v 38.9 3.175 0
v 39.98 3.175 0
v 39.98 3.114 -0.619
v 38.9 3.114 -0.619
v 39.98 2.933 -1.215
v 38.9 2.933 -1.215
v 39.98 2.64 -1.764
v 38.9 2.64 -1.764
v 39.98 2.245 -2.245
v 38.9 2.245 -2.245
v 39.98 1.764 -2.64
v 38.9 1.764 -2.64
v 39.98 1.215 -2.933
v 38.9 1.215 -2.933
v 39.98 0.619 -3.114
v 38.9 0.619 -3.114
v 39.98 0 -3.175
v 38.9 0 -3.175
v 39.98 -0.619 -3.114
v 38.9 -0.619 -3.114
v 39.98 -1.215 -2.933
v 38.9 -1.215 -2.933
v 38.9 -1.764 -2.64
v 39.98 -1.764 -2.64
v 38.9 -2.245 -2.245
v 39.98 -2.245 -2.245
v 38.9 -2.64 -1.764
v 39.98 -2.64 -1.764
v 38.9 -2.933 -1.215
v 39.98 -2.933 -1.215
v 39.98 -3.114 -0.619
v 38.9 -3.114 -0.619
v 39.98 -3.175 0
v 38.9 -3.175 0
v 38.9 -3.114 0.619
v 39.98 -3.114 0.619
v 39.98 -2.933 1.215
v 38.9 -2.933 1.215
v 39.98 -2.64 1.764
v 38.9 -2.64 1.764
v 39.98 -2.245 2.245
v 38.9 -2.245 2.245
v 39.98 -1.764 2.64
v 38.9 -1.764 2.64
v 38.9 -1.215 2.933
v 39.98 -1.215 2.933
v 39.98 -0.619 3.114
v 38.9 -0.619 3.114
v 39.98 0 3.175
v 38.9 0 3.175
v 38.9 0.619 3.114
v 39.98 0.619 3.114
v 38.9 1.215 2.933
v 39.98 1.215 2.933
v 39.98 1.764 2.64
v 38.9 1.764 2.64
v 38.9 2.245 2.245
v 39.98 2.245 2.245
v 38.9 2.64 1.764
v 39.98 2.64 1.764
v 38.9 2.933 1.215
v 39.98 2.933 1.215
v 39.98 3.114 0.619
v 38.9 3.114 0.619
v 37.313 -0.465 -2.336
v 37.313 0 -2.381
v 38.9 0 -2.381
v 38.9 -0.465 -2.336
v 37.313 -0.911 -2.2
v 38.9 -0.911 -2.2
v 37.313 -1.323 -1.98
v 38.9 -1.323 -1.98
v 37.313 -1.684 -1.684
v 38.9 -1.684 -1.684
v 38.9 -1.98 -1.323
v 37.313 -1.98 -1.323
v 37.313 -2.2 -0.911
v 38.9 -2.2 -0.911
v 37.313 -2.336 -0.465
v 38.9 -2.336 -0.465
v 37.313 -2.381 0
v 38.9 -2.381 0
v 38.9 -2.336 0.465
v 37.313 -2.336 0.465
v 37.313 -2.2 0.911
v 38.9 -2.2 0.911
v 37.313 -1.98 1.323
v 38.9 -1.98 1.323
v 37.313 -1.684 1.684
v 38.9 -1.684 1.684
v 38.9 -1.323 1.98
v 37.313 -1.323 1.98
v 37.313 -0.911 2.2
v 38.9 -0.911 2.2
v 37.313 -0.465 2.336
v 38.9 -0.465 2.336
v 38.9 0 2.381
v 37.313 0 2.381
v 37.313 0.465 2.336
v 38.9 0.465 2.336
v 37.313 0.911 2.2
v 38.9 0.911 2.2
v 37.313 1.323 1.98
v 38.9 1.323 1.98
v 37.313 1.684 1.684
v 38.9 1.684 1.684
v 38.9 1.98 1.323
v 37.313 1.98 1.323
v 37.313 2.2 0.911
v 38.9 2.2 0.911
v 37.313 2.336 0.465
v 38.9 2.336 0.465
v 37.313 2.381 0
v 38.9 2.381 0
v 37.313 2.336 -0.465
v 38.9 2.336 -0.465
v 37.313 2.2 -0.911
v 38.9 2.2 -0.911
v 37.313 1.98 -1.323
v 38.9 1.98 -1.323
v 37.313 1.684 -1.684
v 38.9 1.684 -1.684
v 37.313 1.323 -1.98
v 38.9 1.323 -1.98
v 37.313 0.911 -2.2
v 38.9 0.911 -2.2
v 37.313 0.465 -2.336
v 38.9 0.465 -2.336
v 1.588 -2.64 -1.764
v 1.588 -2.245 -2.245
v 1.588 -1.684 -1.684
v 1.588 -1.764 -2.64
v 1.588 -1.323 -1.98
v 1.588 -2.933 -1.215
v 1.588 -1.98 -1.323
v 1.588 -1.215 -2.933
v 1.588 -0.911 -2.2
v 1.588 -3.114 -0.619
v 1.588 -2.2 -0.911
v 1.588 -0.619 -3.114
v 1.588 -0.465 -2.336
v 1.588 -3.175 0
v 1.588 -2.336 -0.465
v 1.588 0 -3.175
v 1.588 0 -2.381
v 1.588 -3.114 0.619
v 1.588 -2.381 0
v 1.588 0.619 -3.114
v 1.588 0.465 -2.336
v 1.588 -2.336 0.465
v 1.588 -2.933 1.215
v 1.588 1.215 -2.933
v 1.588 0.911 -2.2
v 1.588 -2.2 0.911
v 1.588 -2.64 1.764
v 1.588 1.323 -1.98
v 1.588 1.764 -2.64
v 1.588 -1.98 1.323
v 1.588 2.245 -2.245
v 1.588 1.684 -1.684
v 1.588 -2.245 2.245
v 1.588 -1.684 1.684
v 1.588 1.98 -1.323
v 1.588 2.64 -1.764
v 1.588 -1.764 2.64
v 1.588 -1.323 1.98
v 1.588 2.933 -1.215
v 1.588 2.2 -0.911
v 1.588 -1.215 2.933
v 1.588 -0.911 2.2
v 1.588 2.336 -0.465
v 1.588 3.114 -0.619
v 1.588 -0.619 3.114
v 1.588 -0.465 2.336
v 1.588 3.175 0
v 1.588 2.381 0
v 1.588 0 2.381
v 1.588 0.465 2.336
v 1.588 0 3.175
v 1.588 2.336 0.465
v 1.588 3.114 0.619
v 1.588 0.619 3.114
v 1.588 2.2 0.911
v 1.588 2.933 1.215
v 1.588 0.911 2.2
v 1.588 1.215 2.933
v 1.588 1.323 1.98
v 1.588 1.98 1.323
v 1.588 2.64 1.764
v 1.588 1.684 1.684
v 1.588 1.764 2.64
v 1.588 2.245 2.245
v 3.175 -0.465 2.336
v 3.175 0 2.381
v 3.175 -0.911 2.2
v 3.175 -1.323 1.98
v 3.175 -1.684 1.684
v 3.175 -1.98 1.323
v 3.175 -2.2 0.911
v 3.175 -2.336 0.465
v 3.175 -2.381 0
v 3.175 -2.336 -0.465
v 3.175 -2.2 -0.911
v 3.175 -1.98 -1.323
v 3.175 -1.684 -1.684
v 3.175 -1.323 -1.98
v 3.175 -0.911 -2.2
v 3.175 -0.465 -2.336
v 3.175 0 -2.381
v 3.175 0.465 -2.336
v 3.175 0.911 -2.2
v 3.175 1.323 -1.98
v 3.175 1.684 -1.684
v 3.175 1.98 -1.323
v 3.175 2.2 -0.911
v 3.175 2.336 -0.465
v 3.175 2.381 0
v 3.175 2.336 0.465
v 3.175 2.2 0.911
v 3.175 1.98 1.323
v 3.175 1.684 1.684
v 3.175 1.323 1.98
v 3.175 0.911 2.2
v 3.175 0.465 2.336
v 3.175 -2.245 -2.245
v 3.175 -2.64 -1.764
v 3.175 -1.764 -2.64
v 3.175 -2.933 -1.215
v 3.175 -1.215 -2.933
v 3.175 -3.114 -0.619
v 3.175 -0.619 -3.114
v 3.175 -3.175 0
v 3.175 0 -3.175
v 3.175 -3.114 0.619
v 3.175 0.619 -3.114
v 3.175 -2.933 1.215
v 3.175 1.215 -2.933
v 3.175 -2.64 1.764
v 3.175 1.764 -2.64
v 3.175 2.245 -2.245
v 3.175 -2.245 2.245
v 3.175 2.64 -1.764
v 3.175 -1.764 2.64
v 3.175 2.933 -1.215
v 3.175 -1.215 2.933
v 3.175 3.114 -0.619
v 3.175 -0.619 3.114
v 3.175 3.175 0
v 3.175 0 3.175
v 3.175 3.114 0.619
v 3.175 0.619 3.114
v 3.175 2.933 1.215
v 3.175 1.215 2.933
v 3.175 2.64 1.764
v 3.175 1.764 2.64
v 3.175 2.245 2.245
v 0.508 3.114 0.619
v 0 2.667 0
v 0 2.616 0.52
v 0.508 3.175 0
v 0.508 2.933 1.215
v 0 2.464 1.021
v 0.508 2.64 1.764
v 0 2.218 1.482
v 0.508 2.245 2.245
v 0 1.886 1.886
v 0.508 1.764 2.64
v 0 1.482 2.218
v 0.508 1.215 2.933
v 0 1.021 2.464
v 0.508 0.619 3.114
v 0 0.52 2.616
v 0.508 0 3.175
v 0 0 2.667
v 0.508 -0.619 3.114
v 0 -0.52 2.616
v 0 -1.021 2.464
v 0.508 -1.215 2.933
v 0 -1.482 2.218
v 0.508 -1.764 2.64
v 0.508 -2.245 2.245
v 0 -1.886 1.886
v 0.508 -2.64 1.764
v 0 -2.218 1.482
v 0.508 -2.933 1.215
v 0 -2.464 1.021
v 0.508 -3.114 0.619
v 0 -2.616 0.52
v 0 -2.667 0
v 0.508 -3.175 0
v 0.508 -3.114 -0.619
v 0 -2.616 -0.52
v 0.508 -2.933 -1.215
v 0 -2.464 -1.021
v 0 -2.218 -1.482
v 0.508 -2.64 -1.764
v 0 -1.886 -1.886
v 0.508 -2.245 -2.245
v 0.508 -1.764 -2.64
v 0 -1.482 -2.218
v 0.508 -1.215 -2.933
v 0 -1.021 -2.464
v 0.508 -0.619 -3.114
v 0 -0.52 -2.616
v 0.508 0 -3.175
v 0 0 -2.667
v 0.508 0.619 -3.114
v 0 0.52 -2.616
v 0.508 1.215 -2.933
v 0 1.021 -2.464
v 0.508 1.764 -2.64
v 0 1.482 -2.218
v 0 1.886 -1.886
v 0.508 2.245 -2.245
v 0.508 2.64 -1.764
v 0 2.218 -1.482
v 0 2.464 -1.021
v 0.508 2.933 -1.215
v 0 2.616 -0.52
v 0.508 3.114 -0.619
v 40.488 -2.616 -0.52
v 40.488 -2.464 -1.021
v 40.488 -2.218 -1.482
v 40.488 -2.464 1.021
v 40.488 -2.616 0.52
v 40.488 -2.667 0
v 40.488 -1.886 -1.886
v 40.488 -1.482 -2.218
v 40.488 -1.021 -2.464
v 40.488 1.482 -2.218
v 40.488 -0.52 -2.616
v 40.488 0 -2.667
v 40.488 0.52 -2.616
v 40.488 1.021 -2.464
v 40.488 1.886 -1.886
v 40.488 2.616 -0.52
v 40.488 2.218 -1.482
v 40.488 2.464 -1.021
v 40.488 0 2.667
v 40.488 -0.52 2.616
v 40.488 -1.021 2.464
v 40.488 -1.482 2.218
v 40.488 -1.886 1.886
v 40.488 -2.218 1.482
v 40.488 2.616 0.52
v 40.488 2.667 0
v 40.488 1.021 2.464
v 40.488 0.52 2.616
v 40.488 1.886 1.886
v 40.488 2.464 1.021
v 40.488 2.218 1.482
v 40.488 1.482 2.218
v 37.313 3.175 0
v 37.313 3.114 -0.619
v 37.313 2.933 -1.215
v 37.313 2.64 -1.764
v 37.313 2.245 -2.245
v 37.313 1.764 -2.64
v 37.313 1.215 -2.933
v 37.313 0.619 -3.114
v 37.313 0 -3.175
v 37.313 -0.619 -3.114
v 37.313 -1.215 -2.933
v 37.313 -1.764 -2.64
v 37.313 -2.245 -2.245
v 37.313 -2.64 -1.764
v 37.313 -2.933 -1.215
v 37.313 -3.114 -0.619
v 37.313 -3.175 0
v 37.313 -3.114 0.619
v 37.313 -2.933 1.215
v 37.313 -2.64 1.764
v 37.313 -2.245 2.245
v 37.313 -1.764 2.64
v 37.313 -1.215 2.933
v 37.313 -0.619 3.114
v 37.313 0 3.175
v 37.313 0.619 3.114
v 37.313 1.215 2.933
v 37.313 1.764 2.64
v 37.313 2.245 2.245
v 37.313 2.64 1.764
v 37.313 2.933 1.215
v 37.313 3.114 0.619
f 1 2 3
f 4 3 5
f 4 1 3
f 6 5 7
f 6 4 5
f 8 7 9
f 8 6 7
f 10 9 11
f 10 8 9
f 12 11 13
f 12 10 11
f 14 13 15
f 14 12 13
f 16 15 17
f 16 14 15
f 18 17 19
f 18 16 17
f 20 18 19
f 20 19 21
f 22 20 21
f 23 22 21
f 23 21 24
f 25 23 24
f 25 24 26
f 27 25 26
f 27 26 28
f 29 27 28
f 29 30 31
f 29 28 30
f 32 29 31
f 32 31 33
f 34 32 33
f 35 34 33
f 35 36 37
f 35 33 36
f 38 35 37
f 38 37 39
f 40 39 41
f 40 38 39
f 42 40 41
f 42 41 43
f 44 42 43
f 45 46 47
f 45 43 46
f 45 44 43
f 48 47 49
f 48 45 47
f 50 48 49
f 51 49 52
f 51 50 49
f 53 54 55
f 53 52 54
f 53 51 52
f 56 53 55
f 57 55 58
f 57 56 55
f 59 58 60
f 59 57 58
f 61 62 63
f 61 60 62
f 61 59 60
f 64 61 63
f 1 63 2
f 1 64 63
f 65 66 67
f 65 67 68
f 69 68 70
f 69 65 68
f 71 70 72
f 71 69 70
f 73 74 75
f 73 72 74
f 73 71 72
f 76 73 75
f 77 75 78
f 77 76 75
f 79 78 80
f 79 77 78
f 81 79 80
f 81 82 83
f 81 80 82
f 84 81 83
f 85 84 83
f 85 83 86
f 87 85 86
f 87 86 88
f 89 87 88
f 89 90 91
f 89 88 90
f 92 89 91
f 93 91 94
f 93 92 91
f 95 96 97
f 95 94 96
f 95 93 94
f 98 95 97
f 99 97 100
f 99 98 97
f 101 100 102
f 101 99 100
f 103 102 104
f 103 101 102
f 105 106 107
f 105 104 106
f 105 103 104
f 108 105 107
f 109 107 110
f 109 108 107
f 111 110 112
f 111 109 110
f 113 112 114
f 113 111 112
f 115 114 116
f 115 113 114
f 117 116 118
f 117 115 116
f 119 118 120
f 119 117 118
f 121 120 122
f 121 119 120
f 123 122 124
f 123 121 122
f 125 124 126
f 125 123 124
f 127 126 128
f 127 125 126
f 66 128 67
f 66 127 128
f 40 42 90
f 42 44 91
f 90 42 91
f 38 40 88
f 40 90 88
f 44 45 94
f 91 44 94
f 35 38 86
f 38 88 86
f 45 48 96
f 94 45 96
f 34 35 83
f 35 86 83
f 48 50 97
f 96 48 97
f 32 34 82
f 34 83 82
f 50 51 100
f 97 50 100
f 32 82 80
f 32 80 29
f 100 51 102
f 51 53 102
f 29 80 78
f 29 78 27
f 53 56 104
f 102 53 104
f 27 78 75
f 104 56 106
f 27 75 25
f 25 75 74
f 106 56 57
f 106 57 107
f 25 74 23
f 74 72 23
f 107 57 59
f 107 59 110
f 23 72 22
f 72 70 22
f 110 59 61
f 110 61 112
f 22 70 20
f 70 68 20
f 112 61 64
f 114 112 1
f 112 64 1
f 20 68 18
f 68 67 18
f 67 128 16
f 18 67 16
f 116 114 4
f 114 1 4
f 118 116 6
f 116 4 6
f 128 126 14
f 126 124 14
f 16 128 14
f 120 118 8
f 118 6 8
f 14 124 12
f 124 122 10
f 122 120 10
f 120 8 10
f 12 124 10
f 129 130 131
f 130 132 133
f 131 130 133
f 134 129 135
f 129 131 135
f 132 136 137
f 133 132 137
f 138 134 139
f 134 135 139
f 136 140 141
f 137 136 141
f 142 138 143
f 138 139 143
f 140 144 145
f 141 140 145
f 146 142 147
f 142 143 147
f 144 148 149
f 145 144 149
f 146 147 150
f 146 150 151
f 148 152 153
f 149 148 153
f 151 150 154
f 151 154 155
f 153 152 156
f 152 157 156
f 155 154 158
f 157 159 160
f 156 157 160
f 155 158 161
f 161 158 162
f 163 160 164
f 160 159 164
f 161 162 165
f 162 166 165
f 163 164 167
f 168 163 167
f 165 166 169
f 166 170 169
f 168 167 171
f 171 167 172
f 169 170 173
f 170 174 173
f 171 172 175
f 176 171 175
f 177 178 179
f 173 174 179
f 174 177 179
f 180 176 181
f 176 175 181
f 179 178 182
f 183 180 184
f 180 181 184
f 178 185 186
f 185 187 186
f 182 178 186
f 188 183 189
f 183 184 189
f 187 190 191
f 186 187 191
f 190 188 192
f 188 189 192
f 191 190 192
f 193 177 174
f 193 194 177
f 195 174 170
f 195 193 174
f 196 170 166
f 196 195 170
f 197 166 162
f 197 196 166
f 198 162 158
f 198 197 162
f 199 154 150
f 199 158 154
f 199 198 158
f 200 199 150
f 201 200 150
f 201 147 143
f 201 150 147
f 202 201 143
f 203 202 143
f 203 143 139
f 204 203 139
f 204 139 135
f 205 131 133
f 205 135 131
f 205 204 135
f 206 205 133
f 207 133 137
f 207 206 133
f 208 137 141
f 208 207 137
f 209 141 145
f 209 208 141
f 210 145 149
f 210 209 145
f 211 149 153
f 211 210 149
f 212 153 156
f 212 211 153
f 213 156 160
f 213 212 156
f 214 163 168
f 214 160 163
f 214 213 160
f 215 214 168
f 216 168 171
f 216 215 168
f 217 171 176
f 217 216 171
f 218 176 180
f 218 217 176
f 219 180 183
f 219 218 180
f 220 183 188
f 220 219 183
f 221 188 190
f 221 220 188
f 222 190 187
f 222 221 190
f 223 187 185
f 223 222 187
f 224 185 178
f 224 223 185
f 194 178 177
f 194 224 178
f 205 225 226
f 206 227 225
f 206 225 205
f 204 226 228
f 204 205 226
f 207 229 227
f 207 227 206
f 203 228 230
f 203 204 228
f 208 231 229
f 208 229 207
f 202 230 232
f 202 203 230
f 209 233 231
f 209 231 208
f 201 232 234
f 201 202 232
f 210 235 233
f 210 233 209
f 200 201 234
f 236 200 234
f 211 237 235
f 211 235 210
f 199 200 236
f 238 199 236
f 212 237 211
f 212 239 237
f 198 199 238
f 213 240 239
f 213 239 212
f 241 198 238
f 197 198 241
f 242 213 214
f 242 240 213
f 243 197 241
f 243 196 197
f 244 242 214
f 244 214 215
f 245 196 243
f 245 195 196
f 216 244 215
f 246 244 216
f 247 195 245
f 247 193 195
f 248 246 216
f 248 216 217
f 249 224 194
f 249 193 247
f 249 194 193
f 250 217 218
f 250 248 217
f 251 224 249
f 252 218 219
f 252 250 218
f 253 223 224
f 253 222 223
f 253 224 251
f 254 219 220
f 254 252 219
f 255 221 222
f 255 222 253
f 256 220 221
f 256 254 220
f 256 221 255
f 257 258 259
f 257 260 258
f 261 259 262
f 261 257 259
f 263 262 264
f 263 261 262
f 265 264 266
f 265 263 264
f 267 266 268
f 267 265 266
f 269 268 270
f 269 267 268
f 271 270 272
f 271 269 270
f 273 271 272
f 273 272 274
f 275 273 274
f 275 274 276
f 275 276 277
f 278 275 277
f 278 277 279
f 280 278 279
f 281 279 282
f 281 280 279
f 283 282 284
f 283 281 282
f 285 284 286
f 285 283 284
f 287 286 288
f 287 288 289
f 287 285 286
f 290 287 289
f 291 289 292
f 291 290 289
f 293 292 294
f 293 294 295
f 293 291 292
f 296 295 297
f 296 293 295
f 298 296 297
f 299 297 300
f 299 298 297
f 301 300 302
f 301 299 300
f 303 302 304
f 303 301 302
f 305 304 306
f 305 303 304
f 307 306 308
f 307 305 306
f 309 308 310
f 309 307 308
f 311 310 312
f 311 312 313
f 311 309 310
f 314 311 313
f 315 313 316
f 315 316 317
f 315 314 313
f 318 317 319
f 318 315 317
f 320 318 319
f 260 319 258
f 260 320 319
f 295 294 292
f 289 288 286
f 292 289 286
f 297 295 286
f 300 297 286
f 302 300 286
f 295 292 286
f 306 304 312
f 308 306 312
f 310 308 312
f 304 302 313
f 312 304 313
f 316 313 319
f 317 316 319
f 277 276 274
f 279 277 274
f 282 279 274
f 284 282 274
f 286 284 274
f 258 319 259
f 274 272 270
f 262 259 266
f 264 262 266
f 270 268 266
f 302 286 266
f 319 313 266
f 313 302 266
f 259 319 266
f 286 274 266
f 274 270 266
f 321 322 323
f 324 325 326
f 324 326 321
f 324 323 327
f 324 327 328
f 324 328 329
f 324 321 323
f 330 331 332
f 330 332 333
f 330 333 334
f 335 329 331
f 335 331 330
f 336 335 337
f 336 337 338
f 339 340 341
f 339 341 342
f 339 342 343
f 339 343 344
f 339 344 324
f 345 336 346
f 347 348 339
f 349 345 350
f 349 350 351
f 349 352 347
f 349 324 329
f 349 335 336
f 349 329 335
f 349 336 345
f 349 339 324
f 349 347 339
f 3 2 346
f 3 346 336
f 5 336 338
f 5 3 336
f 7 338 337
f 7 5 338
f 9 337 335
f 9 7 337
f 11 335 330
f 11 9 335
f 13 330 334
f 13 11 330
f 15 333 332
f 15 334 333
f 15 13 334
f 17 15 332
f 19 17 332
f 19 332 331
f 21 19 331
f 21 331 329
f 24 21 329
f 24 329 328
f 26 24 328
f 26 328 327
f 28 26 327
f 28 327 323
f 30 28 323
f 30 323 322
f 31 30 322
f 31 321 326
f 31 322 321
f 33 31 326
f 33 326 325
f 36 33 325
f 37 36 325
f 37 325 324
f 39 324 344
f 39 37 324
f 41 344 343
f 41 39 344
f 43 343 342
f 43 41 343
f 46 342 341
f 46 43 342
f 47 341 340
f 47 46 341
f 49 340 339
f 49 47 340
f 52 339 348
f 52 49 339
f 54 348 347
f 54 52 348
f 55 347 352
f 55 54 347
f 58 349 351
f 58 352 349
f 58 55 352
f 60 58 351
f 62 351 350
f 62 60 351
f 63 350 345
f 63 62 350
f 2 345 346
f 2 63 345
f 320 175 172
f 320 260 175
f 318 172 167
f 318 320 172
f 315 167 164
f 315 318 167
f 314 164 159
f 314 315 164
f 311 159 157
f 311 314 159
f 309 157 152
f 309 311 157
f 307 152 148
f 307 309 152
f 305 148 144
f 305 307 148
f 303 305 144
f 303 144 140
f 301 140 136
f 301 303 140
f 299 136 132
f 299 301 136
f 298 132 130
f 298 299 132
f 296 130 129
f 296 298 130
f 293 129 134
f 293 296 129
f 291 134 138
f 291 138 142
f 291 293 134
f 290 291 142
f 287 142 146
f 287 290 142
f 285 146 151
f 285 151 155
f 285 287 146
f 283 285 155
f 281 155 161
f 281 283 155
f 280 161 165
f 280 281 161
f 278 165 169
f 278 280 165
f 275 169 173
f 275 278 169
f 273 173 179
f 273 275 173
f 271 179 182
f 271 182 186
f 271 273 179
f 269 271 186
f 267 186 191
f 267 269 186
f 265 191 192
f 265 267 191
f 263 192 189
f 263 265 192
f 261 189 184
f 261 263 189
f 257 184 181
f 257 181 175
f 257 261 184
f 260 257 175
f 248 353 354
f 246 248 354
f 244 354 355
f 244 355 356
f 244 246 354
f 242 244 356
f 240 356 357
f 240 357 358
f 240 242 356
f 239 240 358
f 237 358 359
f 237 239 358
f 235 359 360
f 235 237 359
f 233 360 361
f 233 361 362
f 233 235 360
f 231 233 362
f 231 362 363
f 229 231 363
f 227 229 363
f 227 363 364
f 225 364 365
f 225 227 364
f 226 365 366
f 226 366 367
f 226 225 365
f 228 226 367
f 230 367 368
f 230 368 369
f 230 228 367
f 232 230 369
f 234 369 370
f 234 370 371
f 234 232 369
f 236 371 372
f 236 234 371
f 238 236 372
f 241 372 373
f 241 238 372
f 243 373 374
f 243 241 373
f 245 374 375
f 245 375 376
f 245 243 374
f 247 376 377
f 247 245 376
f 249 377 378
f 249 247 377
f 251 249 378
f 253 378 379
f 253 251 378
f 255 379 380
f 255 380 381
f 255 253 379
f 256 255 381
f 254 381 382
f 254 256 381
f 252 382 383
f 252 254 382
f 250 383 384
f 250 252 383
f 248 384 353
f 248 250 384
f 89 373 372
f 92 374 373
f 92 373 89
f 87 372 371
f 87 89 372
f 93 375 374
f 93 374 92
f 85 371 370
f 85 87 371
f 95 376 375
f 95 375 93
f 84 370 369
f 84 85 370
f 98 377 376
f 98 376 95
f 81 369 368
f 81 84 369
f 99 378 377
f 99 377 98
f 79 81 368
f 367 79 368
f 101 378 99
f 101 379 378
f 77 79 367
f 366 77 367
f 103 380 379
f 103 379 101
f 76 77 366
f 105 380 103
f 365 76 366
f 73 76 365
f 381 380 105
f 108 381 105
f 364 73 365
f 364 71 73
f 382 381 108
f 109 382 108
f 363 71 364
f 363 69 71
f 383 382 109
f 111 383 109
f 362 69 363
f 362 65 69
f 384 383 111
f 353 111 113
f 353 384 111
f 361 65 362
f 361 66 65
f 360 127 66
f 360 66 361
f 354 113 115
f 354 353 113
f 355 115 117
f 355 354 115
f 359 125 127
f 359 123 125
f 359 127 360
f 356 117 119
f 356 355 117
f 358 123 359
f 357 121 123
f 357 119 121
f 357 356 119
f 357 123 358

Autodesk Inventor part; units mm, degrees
ref_plane "YZ Plane" through (0, 0, 0) normal (1, 0, 0) x (0, 1, 0)
sketch "Sketch1" plane through (0, 0, 0) normal (1, 0, 0) x (0, 1, 0)
  circle A0 centre (0, 0) radius 3.175
  dimension "d0" = 6.35
extrude "Extrusion1" add sketch "Sketch1" along normal blind 40.4876
chamfer "Chamfer1" distance 0.508 angle 45 2 edges at (40.4876, -3.175, 0) (0, -3.175, 0)
ref_plane "Work Plane1" through (37.3126, 0, 0) normal (1, 0, 0) x (0, 0, -1)
sketch "Sketch2" plane through (37.3126, 0, 0) normal (1, 0, 0) x (0, 0, -1)
  circle A0 centre (0, 0) radius 2.3813
  circle A1 centre (0, 0) radius 3.175
  dimension "d7" = 4.7625
extrude "Extrusion2" cut sketch "Sketch2" along normal blind 1.5875
ref_plane "Work Plane2" through (3.175, 0, 0) normal (-1, 0, 0) x (0, 0, 1)
sketch "Sketch3" plane through (3.175, 0, 0) normal (-1, 0, 0) x (0, 0, 1)
  circle A0 centre (0, 0) radius 2.3813
  circle A1 centre (0, 0) radius 3.175
  dimension "d11" = 4.7625
extrude "Extrusion3" cut sketch "Sketch3" along normal blind 1.5875
properties part number "handle pivot pin"
